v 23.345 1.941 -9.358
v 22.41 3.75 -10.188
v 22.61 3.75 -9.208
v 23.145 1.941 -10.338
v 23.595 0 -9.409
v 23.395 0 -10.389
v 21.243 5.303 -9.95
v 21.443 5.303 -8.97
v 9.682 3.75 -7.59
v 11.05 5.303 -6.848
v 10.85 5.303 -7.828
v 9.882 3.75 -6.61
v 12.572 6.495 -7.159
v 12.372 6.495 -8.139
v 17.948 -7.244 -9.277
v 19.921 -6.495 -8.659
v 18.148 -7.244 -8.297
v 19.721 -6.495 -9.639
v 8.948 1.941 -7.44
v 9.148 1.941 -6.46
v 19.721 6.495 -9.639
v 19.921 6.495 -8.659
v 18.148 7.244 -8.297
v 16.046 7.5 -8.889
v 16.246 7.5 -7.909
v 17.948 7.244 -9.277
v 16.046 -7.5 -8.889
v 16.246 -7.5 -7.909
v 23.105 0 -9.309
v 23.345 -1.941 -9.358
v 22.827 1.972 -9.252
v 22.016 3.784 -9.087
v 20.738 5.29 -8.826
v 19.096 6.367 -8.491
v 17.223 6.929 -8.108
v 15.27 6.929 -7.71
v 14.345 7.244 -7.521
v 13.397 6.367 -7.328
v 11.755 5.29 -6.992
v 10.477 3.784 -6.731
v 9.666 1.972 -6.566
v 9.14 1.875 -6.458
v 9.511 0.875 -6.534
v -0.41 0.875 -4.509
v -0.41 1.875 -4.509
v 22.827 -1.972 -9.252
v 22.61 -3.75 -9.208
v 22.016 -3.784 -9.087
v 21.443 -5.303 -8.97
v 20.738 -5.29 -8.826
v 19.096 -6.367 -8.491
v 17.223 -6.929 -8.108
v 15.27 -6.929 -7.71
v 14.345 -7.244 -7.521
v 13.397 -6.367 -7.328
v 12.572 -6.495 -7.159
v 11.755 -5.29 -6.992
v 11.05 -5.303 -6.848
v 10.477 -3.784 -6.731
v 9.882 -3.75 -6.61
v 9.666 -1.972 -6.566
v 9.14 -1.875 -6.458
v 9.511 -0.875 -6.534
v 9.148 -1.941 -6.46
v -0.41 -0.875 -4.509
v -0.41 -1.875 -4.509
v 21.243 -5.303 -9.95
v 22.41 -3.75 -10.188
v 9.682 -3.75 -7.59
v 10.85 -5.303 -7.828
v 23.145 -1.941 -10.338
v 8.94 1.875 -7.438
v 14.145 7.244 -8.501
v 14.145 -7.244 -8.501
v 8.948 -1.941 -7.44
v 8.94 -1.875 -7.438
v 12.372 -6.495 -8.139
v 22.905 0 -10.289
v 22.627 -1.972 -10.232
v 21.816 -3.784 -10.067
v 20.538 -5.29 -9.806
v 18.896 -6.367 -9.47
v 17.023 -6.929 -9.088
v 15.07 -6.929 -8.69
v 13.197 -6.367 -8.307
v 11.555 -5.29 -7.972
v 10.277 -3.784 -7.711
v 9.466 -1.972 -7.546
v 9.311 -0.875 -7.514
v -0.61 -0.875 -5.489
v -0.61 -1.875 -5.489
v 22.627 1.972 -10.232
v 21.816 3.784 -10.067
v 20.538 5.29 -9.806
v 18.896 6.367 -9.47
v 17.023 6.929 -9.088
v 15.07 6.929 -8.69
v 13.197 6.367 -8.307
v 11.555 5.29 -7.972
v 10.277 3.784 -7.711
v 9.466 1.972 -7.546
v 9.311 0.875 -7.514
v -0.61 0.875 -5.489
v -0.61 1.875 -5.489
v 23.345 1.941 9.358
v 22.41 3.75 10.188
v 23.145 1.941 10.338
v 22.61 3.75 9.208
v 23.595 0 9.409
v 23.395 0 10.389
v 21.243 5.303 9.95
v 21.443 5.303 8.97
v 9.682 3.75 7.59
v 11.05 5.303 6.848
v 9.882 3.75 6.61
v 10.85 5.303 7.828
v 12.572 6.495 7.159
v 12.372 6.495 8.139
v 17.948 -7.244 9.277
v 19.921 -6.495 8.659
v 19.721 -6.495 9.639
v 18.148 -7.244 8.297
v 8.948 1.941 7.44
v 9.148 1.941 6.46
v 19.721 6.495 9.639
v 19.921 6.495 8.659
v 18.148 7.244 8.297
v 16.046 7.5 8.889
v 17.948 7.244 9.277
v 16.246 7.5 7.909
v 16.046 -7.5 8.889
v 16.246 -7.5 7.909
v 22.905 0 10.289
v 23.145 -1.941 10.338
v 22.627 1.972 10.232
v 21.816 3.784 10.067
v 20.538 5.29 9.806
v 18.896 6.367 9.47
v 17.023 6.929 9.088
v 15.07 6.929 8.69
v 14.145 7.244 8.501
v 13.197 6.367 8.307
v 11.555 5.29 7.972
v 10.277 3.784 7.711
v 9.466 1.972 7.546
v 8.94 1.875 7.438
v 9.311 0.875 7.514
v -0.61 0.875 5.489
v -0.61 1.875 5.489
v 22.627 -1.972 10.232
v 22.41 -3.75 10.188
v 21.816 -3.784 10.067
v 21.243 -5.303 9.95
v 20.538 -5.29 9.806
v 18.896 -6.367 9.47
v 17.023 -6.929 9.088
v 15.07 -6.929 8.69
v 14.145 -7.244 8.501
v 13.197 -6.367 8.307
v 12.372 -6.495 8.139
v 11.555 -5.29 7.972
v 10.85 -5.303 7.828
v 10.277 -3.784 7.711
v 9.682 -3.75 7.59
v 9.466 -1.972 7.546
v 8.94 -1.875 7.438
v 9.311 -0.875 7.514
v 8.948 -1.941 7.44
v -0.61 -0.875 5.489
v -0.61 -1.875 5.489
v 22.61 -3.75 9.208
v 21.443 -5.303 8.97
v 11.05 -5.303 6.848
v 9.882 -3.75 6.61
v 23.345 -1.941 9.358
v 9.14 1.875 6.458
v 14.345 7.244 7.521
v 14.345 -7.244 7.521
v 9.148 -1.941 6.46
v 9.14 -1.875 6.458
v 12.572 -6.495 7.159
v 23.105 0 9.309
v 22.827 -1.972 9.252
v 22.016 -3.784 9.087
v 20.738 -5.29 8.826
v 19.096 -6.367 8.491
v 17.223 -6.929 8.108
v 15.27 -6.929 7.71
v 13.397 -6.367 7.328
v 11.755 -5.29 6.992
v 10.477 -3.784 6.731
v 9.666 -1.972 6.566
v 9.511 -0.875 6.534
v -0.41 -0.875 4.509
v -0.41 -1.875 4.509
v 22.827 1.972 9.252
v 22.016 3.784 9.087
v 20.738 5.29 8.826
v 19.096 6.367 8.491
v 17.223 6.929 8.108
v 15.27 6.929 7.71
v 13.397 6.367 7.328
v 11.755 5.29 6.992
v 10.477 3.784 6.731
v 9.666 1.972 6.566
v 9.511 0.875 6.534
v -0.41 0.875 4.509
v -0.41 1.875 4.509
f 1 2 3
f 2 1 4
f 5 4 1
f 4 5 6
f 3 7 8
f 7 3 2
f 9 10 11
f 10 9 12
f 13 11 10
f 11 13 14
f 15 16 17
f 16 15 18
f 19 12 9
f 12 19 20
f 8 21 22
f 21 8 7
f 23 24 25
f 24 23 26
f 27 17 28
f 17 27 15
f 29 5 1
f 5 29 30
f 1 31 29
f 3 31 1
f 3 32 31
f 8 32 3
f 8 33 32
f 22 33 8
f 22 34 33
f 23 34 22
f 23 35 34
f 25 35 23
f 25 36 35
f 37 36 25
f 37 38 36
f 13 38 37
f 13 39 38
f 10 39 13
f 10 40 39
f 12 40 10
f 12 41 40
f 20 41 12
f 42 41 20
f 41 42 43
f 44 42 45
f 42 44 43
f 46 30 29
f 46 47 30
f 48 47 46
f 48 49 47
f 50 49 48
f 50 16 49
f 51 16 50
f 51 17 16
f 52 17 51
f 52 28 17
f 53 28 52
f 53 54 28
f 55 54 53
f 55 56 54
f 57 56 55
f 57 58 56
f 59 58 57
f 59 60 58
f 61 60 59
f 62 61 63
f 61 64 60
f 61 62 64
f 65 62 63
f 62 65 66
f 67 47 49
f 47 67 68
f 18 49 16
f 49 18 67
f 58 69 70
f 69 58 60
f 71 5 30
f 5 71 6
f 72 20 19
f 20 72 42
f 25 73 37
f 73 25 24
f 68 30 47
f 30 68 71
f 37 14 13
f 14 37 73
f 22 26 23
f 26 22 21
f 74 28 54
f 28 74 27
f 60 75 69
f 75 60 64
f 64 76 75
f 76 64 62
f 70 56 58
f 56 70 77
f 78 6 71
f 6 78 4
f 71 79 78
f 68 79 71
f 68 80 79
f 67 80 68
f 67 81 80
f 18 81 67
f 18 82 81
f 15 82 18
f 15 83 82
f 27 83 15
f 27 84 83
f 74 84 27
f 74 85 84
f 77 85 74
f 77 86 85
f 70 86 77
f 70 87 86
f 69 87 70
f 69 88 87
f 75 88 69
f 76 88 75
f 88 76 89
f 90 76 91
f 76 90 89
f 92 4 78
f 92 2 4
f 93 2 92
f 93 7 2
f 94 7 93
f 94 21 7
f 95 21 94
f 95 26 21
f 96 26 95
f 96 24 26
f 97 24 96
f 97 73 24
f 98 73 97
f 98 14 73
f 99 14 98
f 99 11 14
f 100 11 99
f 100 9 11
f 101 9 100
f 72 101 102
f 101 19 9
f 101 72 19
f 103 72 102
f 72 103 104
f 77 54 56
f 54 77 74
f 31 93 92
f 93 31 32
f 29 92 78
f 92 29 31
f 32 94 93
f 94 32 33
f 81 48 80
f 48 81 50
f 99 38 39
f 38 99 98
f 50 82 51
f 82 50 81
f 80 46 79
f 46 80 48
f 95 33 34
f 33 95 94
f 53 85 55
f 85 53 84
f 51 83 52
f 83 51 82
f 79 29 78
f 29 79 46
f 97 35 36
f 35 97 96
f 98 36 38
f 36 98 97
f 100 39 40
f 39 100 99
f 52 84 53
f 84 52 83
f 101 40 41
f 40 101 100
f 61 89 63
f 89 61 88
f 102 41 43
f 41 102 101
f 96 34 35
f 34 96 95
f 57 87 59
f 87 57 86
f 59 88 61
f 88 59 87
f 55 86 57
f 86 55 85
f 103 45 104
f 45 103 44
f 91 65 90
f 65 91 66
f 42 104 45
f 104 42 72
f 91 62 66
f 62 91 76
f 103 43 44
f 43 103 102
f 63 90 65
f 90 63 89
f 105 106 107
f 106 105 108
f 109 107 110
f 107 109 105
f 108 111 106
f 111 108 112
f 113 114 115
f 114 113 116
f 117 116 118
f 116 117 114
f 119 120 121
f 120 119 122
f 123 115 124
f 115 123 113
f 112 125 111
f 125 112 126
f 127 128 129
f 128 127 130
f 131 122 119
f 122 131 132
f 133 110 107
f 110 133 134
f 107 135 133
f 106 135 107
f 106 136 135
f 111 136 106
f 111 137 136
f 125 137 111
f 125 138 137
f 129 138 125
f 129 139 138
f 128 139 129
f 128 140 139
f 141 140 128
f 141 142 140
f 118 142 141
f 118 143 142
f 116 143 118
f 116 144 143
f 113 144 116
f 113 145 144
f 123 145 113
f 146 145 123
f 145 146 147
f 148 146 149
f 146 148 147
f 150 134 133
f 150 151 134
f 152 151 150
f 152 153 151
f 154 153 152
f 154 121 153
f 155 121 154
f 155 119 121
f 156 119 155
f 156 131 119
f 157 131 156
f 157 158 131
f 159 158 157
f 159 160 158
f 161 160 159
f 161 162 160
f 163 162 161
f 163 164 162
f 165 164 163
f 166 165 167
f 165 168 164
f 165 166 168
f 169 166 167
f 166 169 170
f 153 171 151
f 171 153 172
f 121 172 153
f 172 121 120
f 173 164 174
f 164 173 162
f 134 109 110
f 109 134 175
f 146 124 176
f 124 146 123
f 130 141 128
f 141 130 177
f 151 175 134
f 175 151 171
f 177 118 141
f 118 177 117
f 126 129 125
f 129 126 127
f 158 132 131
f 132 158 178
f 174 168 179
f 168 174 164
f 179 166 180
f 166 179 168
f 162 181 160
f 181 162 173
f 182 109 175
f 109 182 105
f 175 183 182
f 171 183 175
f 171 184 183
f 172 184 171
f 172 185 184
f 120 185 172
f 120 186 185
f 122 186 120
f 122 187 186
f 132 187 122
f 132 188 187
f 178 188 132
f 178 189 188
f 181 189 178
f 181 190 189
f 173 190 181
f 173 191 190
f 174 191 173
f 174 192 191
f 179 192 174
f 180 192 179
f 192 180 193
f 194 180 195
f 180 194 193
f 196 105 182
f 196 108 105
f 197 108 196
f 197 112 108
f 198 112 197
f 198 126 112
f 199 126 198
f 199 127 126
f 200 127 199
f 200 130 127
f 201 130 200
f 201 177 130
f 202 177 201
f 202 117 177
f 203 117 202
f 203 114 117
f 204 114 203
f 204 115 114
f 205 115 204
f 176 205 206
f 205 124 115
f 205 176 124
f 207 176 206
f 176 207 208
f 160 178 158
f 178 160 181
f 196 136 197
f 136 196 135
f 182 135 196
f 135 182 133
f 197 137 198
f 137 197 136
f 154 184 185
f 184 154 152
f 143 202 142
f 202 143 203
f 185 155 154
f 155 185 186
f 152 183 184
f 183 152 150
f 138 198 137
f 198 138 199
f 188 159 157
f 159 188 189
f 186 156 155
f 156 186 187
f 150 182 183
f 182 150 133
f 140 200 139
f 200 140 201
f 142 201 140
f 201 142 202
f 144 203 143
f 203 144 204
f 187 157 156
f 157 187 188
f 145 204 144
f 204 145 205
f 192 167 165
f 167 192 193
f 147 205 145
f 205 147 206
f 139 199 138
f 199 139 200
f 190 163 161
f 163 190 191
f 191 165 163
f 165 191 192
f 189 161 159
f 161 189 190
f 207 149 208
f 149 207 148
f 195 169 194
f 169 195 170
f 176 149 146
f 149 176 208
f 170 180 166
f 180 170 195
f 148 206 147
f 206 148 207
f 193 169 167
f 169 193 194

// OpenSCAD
front_hi=4;
back_hi=10;
width=25;
len=15;
thickness=1;

//-- handle
diam=15;
h_len=10;


ang = asin( (back_hi/2 - front_hi/2)/ len);

module handle() 
{
  difference() {
    union() {
      difference() {
        cylinder(r=15/2, h=thickness,center=true);
        cylinder(r=(15-thickness)/2, h=thickness+1,center=true);
      }

      translate([-h_len/2-diam/2+thickness/2,0,0])
        cube([h_len,diam/4,thickness],center=true);
    }

    translate([-h_len/2-diam/2+thickness/2,0,0])
    cube([h_len+2*thickness, diam/4-2*thickness, thickness+1], center=true);
  }

}


module body()
{
  cube([thickness,width,back_hi],center=true);

  for(i=[-1,1]) {
    translate([0,0,i*back_hi/2])
      rotate([0,-i*ang,0])
       translate([-len/2,0,0])
         cube([len, width, thickness],center=true);

    translate([0,0,i*back_hi/2])
      rotate([90,0,0])
        cylinder(r=1.2/2, h=width, center=true, $fn=10);
  }
}


*body();

for(i=[-1,1]) {
  rotate([0,-i*ang,0])
    translate([diam/2+h_len, 0, i*back_hi/2])
      handle();
}
